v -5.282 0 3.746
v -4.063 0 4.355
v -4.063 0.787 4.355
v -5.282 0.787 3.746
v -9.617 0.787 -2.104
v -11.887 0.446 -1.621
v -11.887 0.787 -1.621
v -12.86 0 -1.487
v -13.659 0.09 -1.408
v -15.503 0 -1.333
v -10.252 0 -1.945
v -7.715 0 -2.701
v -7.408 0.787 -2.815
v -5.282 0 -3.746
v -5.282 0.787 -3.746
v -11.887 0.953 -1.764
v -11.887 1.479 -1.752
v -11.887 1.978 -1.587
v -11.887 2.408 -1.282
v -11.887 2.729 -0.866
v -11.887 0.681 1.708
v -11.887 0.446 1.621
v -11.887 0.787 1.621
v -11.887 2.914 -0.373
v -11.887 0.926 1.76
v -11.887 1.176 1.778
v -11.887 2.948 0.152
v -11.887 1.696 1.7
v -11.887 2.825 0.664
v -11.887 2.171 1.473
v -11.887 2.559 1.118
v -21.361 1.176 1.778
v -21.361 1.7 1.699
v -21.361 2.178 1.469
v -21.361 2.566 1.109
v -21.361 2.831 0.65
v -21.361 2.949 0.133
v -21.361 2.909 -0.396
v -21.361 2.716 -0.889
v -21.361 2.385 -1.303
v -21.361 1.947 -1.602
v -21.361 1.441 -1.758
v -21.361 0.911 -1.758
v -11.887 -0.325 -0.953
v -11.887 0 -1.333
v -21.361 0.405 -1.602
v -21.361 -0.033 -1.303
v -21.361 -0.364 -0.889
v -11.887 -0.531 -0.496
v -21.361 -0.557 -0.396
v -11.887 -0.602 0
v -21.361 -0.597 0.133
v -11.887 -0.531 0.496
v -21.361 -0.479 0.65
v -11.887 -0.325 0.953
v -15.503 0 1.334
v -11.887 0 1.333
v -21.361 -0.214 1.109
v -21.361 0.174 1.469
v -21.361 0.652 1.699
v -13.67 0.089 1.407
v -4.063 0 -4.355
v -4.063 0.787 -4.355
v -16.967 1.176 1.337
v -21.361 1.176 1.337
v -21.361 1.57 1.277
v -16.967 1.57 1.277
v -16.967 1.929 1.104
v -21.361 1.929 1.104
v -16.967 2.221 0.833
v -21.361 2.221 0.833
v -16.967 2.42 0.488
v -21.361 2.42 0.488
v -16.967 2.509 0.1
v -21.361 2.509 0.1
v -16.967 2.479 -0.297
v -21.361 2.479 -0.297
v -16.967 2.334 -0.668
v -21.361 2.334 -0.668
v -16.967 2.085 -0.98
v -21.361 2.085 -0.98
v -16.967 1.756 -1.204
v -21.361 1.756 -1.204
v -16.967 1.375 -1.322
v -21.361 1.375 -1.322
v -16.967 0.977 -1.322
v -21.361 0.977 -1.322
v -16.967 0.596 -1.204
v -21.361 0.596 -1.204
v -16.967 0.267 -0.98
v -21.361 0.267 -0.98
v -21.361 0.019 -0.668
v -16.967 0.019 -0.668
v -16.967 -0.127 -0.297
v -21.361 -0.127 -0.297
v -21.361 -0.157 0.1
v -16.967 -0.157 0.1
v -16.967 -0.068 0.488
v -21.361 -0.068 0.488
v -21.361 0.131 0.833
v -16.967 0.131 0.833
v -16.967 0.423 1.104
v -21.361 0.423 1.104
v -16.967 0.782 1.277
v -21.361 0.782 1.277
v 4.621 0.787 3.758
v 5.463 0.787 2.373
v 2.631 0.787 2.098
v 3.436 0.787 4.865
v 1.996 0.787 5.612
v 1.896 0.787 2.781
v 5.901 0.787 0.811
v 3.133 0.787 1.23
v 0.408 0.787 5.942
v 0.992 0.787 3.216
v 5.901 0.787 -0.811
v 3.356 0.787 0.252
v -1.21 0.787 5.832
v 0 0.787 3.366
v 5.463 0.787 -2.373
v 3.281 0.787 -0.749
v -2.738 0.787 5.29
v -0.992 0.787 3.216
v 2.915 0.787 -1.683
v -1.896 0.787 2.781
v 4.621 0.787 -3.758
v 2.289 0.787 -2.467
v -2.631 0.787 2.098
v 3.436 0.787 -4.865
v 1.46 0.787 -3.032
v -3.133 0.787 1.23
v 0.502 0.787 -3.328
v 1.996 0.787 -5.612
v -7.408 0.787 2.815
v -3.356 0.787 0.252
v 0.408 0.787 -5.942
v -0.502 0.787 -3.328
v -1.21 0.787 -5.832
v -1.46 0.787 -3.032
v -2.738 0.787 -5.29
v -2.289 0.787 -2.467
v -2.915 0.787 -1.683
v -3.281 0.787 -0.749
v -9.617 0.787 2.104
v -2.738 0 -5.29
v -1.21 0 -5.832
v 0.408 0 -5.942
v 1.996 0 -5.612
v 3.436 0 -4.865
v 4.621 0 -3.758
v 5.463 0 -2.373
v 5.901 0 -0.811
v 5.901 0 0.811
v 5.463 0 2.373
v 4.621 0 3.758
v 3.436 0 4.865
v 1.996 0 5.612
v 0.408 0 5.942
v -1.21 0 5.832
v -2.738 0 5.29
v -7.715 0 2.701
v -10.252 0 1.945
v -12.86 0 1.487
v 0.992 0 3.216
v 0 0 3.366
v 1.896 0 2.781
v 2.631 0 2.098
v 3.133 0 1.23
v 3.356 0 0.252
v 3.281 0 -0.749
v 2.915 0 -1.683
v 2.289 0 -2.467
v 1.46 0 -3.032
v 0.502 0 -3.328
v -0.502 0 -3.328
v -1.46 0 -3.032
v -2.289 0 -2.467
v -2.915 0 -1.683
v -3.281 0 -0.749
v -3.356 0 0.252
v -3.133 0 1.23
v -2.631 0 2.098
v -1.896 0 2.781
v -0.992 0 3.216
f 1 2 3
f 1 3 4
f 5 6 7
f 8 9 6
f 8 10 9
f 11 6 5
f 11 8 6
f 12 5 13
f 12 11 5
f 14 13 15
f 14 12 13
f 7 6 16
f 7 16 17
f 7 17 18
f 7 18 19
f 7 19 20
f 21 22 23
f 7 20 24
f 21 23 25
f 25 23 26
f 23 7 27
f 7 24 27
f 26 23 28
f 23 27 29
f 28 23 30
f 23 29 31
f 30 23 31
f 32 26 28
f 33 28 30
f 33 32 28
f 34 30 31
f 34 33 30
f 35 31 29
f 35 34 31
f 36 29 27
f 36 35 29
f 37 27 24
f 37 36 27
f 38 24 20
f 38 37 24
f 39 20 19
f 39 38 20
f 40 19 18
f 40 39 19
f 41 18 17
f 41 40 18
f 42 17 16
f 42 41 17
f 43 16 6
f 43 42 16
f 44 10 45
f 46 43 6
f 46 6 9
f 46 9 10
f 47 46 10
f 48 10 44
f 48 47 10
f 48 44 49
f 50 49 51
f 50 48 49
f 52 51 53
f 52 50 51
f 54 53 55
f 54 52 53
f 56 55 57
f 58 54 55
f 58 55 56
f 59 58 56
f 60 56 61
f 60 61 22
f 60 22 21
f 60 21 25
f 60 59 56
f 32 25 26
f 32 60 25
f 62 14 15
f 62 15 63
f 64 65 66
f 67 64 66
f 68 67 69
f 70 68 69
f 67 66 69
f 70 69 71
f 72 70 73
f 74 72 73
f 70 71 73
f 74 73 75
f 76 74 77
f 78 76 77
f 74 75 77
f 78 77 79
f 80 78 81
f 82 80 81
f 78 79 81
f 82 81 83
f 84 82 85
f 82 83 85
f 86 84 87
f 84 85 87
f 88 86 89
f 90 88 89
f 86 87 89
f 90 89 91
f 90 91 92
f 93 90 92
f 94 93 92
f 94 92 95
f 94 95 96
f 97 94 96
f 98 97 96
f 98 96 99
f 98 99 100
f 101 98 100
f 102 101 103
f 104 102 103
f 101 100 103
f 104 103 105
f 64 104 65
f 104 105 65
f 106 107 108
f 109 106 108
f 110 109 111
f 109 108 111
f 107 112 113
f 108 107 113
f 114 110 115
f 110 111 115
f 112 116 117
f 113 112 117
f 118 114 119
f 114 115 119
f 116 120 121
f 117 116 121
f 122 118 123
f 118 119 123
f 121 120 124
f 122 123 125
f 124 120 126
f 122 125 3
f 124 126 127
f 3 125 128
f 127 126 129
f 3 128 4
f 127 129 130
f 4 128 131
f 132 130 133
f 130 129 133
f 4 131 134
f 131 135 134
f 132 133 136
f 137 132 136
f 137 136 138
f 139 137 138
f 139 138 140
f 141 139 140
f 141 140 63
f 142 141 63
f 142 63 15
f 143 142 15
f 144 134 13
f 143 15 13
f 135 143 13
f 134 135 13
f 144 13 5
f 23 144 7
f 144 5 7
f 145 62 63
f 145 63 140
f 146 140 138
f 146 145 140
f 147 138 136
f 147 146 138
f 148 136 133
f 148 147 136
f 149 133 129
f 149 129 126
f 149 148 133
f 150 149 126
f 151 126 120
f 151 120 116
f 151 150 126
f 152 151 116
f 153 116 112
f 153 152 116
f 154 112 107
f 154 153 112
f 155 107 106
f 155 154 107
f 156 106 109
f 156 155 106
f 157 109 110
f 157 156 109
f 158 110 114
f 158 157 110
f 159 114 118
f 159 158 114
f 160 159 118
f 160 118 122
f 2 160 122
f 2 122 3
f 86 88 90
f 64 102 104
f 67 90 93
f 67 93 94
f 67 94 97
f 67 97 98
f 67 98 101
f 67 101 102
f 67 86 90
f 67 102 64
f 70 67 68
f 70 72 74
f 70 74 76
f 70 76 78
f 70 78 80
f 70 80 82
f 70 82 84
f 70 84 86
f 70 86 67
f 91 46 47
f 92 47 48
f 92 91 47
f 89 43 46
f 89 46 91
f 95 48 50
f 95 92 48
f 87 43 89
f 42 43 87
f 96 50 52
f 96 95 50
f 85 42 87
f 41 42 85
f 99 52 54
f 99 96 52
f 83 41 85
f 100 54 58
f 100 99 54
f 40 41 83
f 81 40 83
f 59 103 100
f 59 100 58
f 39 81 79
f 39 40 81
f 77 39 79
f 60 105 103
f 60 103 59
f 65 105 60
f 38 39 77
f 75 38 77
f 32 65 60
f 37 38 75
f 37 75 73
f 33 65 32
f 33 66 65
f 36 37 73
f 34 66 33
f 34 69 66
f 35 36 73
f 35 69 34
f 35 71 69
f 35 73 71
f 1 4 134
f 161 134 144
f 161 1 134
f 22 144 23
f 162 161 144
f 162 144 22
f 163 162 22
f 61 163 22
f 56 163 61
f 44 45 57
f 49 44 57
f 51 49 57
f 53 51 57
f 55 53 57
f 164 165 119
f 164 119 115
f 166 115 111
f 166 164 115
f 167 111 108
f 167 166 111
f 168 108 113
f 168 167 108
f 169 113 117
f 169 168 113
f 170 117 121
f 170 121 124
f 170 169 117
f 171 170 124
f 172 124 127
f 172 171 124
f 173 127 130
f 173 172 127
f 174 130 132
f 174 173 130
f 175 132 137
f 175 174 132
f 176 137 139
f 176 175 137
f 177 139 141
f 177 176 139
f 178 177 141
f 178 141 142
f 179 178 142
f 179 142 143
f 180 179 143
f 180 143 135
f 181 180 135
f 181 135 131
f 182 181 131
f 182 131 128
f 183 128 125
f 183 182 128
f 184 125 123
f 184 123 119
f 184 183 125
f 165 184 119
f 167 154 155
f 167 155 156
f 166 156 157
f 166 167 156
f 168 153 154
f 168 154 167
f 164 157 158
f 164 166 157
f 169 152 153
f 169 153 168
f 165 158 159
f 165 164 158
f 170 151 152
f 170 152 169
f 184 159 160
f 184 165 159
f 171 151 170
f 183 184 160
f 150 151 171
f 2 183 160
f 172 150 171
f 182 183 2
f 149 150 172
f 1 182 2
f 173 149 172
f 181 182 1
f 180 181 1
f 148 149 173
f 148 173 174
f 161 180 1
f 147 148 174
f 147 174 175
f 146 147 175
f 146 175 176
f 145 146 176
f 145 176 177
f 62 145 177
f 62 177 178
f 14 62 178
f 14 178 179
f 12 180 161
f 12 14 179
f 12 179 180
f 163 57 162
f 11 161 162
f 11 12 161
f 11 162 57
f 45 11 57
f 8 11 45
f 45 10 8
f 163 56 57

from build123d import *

# Parameters (mm, degrees)
SKETCH1_R           = 3.3655
BOSS_EXTRUDE1_DEPTH = 0.7874
SKETCH2_R           = 1.778
BOSS_EXTRUDE2_DEPTH = 9.4742
SKETCH3_R           = 1.336576357
CUT_EXTRUDE1_DEPTH  = 4.3942


with BuildPart() as part:
    # Sketch1 → Boss-Extrude1 (new body)
    with BuildSketch(Plane(origin=(0, 0, 0), x_dir=(1, 0, 0), z_dir=(0, 1, 0))):
        with BuildLine():
            Line((-21.3614, 0), (-21.3614, 1.3335))
            Line((-21.3614, 1.3335), (-15.503317076, 1.3335))
            ThreePointArc((-15.503317076, 1.3335), (-10.252349187, 1.944748659), (-5.282190317, 3.745806542))
            Line((-5.282190317, 3.745806542), (-4.063378909, 4.355050118))
            ThreePointArc((-4.063378909, 4.355050118), (5.9563, 0), (-4.063378909, -4.355050118))
            Line((-4.063378909, -4.355050118), (-5.282190317, -3.745806542))
            ThreePointArc((-5.282190317, -3.745806542), (-10.252349187, -1.944748659), (-15.503317076, -1.3335))
            Line((-15.503317076, -1.3335), (-21.3614, -1.3335))
            Line((-21.3614, -1.3335), (-21.3614, 0))
        make_face()
        with Locations(Location((0, 0, 0), (0, 0, 270))):
            Circle(SKETCH1_R, mode=Mode.SUBTRACT)
    extrude(amount=BOSS_EXTRUDE1_DEPTH)

    # Sketch2 → Boss-Extrude2 (add)
    with BuildSketch(Plane.ZY.offset(21.3614)):
        with Locations((0, 1.176036458)):
            Circle(SKETCH2_R)
    extrude(amount=-BOSS_EXTRUDE2_DEPTH)

    # Sketch3 → Cut-Extrude1 (cut)
    with BuildSketch(Plane.ZY.offset(21.3614)):
        with Locations((0, 1.176036458)):
            Circle(SKETCH3_R)
    extrude(amount=-CUT_EXTRUDE1_DEPTH, mode=Mode.SUBTRACT)


solid = part.part
